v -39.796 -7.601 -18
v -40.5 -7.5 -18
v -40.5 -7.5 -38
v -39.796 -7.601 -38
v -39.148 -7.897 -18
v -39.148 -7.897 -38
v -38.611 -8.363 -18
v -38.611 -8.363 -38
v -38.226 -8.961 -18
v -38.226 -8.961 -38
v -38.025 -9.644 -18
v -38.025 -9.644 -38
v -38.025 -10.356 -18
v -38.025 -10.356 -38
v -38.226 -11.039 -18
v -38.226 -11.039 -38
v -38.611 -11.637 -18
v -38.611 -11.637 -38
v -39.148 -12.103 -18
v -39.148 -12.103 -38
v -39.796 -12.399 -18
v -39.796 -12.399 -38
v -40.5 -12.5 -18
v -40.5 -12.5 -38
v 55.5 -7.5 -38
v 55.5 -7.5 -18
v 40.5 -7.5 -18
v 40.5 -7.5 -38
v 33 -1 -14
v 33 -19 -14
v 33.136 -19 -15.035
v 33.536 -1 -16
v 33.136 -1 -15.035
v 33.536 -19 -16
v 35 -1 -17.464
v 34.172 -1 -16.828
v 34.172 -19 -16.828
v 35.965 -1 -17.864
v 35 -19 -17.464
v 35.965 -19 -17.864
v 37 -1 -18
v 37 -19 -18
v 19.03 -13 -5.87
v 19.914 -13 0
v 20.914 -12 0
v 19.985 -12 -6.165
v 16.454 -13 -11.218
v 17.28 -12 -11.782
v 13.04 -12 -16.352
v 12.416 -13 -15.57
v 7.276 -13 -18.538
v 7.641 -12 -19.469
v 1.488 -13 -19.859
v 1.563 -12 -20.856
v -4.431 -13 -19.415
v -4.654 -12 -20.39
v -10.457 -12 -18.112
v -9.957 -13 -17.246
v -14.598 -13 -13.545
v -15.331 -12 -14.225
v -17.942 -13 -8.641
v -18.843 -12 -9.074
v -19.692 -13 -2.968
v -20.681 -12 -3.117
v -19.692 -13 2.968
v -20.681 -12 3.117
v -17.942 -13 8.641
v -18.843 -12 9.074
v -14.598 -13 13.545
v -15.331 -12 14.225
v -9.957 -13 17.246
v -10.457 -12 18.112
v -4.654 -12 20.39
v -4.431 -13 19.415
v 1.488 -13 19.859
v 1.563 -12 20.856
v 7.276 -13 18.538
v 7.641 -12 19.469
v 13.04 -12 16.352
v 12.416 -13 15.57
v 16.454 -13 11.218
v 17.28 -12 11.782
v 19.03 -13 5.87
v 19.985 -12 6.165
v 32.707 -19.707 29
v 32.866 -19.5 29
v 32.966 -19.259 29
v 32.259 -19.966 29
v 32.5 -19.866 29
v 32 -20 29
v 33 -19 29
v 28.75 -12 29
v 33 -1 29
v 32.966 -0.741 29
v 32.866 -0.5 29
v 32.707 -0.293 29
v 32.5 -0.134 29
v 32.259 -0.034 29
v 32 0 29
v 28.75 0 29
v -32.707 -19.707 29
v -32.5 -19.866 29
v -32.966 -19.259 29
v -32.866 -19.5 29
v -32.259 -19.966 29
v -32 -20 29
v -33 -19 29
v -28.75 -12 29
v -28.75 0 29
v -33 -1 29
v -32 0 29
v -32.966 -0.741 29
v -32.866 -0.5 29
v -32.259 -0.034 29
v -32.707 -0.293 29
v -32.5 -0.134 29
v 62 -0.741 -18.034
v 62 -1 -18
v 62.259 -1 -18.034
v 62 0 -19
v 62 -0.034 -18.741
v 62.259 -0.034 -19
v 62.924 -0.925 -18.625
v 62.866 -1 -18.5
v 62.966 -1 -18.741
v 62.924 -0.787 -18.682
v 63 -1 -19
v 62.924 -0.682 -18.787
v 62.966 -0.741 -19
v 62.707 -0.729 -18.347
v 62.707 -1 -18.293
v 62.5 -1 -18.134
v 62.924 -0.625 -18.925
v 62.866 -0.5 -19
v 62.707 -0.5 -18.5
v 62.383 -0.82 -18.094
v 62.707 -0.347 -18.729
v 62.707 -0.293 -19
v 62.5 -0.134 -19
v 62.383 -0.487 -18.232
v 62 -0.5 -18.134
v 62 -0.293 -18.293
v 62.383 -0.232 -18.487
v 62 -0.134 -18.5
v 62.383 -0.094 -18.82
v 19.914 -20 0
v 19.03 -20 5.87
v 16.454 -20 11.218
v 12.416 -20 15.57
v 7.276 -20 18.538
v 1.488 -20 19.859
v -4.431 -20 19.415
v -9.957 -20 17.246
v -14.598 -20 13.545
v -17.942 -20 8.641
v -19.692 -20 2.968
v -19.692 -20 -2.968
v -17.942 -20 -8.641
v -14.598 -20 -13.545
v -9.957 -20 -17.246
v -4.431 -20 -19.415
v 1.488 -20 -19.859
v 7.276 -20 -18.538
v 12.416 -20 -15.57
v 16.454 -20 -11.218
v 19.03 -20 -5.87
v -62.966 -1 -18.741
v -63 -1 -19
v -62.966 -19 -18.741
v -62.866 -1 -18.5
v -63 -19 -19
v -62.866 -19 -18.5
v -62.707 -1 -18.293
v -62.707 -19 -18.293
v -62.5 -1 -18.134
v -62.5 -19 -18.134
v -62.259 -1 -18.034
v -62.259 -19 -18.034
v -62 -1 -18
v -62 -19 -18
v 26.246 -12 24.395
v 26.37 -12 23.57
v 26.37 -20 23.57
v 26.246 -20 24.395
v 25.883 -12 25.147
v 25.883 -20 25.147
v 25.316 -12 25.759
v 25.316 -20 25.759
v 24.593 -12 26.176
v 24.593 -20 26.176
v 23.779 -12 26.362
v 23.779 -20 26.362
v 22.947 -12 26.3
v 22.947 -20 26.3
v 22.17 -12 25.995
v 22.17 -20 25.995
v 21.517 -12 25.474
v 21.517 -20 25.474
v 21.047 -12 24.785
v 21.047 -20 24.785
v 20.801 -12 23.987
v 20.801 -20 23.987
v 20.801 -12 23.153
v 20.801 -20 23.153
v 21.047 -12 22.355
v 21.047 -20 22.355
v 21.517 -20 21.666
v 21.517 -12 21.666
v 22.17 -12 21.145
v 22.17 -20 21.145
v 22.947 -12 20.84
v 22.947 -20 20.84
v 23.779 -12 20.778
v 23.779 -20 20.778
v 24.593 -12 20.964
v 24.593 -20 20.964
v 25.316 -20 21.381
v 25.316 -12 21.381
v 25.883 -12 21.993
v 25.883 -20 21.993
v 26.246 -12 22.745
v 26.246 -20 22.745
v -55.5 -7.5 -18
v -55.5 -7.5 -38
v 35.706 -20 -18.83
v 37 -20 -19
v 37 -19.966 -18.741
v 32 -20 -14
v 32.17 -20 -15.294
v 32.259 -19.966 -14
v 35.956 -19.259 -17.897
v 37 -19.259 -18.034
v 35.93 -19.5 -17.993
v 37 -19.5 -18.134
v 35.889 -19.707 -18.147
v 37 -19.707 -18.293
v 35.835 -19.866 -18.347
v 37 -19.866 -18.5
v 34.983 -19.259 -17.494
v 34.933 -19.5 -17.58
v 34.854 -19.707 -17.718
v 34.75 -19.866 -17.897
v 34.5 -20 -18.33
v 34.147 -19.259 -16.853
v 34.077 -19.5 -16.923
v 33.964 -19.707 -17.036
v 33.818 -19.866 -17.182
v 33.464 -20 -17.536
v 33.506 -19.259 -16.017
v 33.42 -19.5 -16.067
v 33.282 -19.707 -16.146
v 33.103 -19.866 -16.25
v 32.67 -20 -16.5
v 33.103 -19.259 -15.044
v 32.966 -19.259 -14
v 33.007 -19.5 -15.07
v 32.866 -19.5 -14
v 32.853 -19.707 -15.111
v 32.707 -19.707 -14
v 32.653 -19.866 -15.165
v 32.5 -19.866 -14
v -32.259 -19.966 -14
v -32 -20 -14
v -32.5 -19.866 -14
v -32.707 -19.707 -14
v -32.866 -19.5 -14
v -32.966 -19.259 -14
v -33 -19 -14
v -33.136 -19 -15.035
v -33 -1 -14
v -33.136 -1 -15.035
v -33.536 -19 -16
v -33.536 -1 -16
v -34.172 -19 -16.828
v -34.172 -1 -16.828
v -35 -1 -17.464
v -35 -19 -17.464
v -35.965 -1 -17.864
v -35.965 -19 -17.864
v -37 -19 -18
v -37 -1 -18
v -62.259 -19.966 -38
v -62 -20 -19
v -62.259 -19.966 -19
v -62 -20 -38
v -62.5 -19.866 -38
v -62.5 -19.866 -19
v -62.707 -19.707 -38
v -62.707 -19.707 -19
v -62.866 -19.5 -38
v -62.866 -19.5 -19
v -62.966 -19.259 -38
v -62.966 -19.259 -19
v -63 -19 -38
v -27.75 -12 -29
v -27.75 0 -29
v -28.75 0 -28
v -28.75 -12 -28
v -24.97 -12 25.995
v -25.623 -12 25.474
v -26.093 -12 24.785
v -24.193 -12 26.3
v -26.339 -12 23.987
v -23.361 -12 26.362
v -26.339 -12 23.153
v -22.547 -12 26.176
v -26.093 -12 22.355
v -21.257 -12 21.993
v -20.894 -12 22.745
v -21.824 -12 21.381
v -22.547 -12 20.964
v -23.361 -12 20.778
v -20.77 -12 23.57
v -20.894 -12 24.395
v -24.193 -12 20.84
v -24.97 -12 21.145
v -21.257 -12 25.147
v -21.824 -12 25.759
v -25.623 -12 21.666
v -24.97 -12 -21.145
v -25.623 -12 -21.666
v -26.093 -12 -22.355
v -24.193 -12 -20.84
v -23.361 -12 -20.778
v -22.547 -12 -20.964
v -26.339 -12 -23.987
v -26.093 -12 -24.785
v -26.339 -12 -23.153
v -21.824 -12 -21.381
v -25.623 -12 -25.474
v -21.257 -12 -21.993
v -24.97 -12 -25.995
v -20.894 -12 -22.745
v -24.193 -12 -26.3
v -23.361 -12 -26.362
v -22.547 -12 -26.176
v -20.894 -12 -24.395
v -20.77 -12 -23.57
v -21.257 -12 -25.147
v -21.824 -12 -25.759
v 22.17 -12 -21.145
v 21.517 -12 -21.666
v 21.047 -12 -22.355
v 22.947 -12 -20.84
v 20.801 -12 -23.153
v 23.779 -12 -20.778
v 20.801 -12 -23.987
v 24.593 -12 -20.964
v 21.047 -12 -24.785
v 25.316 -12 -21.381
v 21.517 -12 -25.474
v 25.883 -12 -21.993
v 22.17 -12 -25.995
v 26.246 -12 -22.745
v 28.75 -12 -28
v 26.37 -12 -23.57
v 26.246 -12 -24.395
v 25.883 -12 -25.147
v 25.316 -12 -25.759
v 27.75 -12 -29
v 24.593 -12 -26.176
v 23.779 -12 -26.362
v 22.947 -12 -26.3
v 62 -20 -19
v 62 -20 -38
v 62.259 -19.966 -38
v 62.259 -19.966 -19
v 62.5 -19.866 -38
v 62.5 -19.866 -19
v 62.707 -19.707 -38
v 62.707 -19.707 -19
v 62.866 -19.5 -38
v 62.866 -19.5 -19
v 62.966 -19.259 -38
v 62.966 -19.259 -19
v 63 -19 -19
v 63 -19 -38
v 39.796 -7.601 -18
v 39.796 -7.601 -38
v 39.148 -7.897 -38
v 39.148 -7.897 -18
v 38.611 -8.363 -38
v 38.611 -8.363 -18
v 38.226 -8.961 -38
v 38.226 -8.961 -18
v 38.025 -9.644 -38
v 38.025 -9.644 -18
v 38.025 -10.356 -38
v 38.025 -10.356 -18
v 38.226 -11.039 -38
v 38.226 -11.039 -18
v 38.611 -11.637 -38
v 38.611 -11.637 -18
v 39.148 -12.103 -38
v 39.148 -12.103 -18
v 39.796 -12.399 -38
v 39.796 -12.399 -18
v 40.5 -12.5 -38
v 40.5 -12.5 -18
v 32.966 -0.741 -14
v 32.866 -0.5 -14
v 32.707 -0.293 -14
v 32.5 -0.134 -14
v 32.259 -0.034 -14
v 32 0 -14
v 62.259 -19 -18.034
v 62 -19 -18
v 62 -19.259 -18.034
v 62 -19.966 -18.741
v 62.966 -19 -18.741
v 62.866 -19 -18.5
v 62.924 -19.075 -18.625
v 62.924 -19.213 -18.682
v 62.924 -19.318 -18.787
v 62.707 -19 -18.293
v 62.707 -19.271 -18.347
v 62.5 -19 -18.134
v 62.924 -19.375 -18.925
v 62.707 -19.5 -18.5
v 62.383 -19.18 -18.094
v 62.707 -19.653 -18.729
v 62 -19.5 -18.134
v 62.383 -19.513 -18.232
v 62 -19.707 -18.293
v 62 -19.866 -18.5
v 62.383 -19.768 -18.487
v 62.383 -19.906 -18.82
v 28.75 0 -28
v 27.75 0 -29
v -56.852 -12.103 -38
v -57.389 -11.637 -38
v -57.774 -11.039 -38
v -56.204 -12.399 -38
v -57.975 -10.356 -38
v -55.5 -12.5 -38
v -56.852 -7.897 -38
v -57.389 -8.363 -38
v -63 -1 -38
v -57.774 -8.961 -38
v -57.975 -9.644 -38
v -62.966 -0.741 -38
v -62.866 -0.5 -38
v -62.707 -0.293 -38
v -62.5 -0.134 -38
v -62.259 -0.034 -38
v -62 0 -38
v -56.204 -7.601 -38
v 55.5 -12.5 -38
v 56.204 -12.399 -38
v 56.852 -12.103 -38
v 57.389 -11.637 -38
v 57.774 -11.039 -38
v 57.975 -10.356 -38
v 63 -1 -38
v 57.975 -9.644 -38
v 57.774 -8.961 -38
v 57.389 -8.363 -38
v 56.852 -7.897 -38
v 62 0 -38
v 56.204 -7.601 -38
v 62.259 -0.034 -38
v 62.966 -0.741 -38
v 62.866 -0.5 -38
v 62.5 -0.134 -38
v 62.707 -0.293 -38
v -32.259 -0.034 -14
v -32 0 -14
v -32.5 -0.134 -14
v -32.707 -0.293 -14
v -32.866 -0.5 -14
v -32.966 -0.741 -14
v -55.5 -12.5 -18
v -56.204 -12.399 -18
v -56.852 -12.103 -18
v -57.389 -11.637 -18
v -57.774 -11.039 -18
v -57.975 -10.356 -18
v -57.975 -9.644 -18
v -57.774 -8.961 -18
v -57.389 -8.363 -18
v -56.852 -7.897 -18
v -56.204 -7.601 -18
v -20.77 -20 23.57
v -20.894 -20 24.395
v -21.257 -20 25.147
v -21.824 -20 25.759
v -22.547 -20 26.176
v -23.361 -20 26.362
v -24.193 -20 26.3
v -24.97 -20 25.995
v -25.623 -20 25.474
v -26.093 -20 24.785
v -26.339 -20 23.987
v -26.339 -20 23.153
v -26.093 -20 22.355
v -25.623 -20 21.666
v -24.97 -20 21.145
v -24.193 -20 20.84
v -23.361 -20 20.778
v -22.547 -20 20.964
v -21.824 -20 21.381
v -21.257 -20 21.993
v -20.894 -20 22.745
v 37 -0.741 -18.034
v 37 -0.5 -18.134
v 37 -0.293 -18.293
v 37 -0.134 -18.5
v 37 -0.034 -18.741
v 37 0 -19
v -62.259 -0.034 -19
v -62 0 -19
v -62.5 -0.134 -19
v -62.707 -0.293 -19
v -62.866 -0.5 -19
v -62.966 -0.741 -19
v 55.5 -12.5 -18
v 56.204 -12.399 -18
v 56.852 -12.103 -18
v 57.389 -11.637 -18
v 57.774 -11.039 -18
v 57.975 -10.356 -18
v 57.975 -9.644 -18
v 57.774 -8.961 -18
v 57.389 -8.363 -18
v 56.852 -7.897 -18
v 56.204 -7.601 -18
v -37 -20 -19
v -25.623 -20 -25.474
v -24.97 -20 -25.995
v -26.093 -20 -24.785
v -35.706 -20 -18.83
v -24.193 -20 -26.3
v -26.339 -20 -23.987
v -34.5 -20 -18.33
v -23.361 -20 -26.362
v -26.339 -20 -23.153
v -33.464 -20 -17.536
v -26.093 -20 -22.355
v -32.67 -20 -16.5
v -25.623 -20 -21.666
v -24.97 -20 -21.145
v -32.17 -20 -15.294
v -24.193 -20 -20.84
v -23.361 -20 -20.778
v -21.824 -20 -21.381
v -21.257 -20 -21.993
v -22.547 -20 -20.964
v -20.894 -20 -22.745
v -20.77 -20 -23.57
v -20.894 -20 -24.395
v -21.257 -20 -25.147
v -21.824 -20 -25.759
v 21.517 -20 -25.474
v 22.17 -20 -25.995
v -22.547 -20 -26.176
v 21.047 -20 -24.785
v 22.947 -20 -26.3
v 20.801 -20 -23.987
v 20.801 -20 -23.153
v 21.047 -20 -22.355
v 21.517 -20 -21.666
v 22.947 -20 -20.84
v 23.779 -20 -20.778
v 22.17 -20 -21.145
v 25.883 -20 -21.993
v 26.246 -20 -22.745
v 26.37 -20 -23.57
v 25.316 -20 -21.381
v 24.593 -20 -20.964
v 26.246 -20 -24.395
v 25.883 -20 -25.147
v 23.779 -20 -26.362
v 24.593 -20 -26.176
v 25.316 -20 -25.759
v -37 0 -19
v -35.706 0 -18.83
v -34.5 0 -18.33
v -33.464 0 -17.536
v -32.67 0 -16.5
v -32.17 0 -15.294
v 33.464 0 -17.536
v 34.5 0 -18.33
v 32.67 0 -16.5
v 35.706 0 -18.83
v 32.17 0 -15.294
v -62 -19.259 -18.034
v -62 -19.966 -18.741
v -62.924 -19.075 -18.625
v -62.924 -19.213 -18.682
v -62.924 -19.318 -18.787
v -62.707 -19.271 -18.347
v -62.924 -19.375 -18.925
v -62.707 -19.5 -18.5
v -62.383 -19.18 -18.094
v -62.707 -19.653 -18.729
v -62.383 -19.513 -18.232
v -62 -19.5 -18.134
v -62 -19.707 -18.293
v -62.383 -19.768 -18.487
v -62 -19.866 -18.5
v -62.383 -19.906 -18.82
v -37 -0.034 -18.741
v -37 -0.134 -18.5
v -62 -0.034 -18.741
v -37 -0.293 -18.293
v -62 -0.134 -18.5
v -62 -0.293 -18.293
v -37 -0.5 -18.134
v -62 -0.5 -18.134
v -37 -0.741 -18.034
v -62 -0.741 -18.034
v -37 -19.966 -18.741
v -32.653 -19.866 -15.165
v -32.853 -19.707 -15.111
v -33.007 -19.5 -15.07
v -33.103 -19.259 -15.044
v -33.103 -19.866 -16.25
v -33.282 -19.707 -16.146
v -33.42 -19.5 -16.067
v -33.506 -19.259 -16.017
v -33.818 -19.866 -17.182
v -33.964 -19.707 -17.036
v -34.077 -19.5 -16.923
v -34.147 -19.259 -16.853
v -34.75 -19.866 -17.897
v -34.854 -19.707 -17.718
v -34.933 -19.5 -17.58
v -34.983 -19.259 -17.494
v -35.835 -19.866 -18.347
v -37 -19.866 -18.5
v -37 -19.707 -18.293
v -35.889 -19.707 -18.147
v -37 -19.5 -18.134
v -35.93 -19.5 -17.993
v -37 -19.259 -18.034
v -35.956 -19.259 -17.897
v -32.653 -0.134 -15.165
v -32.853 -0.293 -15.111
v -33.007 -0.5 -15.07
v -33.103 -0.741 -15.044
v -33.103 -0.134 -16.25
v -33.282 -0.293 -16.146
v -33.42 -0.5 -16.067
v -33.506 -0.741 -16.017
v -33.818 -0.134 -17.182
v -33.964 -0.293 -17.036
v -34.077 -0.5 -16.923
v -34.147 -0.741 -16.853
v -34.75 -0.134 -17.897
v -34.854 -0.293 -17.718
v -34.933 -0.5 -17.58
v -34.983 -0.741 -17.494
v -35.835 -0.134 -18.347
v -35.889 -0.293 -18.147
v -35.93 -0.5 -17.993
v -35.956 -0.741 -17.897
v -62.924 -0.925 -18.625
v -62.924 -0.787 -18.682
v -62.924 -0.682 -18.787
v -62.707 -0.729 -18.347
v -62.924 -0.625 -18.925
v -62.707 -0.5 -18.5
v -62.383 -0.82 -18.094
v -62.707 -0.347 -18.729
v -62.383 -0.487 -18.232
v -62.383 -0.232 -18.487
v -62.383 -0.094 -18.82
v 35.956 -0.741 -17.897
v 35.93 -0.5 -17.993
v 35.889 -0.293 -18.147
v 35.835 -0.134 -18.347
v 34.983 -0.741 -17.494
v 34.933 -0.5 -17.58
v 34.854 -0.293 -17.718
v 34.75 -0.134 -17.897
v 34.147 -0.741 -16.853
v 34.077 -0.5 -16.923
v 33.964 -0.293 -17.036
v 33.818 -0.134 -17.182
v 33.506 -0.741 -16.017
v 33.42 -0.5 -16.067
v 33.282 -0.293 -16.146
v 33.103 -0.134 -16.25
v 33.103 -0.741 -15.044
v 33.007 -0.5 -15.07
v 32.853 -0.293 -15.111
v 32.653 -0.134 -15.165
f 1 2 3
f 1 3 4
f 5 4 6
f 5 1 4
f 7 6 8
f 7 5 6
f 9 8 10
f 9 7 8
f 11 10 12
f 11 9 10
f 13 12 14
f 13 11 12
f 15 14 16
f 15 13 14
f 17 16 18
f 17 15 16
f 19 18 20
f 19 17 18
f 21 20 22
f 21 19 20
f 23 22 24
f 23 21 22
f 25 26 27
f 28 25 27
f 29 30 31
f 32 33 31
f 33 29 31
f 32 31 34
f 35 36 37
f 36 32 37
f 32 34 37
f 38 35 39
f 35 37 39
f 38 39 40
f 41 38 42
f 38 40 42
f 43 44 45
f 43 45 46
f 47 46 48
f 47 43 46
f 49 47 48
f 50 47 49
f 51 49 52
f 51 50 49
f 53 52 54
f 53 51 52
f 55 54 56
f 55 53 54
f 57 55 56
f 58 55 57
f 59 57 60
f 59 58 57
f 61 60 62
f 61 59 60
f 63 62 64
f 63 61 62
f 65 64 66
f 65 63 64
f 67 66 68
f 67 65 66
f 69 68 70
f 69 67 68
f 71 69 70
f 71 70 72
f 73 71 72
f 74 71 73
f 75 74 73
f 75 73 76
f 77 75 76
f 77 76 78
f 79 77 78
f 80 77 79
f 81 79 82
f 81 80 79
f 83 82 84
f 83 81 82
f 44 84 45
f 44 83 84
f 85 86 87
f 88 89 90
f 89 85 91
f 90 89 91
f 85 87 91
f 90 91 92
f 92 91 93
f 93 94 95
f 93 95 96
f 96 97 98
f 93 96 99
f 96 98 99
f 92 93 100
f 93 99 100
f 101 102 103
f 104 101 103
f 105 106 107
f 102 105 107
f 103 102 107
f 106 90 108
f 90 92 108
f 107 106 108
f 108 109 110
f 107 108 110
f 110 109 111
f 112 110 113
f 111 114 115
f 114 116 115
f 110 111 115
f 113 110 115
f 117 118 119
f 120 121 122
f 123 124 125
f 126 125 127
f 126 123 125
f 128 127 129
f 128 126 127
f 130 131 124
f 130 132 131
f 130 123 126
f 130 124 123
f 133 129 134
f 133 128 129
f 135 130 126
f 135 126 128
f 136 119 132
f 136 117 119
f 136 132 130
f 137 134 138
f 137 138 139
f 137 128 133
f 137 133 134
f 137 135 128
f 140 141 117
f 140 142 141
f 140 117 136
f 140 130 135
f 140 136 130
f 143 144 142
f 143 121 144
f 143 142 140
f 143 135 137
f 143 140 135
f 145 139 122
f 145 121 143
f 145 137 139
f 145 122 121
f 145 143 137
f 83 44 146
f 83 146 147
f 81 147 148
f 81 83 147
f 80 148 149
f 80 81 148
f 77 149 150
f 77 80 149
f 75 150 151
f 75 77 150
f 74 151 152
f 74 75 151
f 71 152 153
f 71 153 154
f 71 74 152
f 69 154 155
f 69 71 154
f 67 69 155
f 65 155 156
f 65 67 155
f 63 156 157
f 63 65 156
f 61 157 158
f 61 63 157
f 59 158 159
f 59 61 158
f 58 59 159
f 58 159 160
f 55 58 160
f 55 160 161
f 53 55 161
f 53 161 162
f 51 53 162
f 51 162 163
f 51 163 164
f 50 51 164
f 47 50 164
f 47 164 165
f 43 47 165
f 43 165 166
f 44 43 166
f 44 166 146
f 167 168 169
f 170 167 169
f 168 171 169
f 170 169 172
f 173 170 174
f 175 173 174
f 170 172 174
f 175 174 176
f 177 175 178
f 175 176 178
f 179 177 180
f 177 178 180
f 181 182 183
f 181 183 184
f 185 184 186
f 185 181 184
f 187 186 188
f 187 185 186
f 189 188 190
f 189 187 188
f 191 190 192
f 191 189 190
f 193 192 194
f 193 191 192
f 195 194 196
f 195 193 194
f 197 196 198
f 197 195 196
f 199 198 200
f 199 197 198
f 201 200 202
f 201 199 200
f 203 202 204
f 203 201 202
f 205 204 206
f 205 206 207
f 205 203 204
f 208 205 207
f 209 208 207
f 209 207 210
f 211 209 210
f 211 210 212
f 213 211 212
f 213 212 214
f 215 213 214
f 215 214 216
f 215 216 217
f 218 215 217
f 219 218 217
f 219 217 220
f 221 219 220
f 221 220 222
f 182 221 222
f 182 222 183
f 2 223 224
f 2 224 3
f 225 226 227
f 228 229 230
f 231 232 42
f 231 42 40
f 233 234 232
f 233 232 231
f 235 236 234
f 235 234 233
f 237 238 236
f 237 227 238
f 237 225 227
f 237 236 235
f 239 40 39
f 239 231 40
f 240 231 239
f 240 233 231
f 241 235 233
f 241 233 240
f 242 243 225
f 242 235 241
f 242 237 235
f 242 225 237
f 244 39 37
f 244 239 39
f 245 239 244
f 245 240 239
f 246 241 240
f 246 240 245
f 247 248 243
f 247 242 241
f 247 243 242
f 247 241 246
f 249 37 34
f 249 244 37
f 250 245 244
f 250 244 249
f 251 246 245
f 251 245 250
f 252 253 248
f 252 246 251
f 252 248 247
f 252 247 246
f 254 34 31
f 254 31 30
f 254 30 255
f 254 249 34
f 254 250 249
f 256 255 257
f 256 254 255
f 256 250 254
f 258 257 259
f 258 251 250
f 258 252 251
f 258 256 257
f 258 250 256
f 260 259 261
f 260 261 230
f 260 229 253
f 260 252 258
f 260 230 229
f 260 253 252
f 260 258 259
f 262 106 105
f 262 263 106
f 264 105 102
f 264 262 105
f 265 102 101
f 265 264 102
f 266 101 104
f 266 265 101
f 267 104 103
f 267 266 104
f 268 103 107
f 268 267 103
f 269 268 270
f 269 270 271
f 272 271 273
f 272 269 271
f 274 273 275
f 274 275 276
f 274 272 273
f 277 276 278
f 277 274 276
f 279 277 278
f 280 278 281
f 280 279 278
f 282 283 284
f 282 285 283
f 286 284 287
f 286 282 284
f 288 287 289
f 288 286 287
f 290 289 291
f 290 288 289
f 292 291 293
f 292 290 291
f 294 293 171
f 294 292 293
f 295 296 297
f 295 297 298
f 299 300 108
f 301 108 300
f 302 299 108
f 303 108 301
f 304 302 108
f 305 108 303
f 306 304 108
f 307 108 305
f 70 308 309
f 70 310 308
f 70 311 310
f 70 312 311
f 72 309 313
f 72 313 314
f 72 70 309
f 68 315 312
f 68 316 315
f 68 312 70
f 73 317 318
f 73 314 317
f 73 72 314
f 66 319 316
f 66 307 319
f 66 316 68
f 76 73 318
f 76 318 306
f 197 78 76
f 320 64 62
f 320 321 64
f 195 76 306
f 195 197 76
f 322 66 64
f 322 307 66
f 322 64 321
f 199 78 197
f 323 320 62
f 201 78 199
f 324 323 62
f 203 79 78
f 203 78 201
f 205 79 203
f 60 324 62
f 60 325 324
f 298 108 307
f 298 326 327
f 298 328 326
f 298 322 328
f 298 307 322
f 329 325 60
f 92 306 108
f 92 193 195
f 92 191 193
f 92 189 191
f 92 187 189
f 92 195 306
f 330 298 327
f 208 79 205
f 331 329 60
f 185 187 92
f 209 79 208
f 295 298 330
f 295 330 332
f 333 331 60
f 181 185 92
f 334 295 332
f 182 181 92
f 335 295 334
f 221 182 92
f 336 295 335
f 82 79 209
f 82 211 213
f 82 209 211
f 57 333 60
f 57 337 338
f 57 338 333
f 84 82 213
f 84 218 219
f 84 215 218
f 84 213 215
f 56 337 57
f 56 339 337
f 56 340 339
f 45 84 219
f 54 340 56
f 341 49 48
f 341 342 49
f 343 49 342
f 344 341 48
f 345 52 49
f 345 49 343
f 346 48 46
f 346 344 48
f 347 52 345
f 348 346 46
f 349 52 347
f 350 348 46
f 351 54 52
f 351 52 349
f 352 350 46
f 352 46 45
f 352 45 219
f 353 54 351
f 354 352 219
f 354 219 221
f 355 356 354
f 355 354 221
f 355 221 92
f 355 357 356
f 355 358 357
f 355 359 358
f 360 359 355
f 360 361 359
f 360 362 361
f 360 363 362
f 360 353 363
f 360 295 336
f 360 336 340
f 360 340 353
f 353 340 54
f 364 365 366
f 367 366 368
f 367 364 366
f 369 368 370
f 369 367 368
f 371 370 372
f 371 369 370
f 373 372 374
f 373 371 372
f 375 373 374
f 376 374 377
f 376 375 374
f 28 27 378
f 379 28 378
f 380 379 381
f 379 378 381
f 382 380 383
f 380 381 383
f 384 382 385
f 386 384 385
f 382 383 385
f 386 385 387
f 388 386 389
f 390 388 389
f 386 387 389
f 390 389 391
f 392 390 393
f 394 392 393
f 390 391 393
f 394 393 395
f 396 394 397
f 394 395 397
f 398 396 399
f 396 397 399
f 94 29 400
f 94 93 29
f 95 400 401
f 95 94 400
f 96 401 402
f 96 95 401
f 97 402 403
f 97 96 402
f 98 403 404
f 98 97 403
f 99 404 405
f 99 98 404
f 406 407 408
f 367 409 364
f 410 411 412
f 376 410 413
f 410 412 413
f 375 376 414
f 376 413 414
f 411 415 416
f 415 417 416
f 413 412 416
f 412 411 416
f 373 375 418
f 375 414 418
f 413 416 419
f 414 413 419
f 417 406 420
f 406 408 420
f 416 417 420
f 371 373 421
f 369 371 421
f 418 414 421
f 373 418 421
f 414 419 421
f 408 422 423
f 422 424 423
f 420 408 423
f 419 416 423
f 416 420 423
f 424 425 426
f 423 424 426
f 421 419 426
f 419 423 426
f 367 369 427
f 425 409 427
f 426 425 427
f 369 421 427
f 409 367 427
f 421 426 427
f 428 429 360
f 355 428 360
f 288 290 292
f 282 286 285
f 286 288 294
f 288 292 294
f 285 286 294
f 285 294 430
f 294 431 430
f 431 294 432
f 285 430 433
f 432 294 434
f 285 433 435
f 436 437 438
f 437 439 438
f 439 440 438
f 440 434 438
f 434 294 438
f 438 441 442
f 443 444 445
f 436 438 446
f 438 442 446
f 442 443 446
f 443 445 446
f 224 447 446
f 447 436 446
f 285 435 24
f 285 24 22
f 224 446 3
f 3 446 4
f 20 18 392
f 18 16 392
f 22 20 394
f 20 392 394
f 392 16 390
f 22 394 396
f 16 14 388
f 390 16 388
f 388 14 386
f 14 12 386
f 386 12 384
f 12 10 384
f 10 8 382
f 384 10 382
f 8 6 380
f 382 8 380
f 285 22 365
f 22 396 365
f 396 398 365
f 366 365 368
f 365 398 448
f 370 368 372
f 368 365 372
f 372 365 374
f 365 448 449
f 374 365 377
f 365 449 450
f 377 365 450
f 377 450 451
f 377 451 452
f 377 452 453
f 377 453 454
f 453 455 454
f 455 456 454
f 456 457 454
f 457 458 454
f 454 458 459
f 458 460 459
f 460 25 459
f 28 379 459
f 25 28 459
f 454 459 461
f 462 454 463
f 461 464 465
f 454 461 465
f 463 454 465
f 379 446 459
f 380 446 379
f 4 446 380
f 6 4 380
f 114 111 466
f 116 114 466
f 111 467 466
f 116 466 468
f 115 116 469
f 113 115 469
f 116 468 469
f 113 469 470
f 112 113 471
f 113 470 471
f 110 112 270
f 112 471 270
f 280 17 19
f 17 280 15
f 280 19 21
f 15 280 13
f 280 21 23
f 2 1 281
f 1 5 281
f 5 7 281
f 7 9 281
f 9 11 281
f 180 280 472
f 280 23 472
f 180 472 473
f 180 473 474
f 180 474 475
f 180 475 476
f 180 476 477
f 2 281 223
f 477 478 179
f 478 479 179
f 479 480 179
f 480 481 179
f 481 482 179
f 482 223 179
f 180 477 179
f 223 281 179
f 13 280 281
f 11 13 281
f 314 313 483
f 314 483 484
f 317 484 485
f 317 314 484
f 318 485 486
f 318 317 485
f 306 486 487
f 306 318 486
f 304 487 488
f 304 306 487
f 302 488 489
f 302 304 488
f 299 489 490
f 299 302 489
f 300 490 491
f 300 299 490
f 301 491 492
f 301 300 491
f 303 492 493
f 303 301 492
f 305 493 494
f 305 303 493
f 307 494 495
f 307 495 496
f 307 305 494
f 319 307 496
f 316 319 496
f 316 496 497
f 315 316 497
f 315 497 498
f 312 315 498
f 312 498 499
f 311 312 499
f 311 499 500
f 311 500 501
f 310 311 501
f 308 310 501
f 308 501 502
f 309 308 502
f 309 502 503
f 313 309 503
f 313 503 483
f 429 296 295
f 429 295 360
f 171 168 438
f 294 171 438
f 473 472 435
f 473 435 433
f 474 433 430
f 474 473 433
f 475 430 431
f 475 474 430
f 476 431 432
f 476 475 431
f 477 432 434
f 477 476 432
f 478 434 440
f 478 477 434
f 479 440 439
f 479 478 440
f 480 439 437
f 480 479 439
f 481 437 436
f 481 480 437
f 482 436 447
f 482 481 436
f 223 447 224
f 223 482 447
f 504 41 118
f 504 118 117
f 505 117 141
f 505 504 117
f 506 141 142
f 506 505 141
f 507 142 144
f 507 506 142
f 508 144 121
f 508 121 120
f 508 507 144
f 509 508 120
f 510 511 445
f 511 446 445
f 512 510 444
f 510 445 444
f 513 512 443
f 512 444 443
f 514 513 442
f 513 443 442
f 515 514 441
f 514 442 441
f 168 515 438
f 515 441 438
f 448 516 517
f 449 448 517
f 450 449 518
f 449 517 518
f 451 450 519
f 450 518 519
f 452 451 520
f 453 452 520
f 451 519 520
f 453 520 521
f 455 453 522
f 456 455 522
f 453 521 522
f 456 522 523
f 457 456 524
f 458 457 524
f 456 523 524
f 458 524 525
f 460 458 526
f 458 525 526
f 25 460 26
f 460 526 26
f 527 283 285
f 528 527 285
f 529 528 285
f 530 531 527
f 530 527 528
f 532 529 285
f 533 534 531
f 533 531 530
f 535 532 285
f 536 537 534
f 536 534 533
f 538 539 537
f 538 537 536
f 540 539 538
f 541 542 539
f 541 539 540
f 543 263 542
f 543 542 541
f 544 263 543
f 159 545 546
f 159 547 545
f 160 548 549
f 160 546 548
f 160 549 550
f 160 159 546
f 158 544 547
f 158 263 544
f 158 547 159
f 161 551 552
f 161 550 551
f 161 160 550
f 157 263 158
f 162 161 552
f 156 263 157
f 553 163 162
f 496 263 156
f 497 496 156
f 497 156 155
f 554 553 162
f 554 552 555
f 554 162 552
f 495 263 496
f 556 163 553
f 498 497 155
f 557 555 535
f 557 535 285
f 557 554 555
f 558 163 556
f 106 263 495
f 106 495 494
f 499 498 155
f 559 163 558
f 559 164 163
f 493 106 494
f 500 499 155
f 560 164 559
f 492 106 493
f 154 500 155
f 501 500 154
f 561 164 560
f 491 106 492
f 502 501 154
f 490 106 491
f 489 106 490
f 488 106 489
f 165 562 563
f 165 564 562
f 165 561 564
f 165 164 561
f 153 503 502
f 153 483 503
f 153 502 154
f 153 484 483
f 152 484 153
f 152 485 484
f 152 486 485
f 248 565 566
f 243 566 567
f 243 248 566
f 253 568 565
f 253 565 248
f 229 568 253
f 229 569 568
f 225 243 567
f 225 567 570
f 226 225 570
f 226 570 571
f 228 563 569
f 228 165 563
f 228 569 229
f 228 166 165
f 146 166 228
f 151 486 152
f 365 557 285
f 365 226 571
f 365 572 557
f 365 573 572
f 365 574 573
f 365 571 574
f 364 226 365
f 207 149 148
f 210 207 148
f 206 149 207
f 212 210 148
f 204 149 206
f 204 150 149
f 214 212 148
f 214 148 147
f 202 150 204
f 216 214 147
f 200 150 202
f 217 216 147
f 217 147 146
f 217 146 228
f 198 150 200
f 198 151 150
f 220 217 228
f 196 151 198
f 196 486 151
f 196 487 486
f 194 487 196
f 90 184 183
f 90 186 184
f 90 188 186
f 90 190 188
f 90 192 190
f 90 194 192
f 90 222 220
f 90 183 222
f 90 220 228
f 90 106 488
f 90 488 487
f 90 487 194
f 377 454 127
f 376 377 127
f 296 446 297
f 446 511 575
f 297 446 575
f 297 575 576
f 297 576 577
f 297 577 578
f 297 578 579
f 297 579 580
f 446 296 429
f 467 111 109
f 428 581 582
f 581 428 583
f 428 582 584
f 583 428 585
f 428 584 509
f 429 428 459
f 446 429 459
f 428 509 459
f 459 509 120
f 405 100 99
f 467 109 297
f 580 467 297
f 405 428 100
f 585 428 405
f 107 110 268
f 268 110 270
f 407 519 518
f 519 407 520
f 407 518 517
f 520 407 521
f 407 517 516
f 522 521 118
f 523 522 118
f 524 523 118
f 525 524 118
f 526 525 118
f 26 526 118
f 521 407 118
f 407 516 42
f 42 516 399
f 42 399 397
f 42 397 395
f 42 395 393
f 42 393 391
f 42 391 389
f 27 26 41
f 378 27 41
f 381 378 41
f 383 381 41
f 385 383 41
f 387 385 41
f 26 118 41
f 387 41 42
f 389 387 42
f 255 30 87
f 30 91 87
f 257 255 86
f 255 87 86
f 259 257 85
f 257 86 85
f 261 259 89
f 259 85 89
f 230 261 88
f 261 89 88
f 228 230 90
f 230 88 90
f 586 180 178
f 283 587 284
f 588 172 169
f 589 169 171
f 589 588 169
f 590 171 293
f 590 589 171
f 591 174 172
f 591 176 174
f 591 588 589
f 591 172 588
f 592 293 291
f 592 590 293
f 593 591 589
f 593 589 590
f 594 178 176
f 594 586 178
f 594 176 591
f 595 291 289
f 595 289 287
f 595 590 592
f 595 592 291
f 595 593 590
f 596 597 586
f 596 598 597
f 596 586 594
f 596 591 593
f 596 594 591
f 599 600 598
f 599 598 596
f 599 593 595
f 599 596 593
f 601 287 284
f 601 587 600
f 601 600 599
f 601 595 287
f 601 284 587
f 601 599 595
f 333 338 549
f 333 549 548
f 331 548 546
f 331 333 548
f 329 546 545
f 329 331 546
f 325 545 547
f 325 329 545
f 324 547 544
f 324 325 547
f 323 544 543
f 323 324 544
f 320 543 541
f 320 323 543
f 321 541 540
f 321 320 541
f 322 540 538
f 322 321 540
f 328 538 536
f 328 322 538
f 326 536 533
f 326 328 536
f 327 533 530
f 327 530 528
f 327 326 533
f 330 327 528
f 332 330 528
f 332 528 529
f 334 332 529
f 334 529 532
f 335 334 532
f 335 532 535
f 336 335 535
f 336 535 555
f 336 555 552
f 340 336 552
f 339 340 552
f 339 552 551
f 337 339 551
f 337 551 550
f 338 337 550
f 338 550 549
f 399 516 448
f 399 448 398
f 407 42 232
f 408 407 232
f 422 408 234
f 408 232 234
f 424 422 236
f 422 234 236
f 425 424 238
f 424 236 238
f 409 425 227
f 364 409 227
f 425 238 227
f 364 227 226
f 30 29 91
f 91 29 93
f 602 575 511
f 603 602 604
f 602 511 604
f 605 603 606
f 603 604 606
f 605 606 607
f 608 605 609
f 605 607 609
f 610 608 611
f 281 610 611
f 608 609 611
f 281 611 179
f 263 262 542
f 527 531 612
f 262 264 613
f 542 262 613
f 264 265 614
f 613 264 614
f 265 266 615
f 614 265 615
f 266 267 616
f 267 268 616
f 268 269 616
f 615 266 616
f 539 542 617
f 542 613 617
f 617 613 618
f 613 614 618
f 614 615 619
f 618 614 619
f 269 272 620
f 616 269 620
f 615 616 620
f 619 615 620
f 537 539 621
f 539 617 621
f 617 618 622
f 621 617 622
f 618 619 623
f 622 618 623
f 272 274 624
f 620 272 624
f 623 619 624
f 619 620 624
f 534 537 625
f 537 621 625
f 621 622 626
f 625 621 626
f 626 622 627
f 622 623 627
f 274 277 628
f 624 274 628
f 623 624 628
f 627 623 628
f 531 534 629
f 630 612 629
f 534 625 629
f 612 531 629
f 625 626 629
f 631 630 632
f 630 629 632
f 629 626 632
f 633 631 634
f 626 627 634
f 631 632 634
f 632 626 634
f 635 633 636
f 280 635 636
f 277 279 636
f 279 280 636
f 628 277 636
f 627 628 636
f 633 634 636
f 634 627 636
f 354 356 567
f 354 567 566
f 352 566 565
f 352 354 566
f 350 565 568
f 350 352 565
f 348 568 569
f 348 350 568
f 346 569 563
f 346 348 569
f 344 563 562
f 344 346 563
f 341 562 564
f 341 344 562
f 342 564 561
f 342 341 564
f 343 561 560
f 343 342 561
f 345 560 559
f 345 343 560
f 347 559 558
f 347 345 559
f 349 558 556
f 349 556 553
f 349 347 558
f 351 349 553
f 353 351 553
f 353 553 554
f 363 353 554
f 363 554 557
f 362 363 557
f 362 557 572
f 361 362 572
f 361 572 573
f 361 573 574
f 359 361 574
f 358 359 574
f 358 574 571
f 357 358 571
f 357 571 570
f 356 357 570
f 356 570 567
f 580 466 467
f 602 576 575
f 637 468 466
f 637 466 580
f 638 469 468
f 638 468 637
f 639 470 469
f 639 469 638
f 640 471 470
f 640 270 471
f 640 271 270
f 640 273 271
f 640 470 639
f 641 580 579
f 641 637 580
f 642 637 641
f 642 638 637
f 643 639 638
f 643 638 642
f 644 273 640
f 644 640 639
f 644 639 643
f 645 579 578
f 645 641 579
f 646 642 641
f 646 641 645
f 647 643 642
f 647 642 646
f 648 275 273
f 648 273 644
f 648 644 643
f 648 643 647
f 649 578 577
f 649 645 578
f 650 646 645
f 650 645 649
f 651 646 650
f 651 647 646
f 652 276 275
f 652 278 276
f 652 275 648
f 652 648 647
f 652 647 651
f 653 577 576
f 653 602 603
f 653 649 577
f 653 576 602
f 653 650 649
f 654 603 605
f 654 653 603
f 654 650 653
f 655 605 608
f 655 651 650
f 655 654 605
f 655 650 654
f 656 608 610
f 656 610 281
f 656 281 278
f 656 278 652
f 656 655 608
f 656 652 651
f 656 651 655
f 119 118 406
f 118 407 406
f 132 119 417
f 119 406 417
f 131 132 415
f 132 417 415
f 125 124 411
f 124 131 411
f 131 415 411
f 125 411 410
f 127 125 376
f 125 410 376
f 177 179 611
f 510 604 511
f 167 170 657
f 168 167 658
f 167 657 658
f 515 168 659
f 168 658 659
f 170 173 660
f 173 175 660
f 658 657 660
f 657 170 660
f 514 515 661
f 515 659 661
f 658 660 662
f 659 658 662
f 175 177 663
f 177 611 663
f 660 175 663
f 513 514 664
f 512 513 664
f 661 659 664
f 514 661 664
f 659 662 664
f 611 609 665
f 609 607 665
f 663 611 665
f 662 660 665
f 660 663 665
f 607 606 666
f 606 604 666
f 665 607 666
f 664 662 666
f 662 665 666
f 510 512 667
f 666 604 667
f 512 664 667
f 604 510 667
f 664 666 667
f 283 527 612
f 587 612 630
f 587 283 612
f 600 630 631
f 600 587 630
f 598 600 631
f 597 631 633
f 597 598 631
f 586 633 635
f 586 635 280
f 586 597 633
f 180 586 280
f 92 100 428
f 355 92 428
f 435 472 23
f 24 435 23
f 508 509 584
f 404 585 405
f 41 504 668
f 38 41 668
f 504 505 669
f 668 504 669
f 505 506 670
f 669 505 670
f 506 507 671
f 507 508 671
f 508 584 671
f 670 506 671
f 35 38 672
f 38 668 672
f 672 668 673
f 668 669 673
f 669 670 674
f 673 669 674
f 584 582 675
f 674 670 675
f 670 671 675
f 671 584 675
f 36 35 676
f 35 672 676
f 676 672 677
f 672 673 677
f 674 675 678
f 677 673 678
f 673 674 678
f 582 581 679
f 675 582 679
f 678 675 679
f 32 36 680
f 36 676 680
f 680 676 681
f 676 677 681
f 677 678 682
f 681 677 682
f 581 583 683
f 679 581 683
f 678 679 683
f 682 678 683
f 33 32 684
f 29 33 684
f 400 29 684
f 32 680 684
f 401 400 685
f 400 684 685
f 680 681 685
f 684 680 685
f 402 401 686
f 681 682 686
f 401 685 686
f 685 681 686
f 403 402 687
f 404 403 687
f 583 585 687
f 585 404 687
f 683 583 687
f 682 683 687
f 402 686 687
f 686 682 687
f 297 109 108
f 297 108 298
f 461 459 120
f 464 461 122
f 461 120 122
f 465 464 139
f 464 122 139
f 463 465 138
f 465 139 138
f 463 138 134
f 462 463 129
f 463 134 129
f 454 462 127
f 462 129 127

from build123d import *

# Parameters (mm, degrees)
SKETCH_R        = 2.8
SKETCH_R_2      = 19.914493
PAD_DEPTH       = 20
SKETCH001_W     = 57.5
SKETCH001_H     = 58
POCKET_DEPTH    = 12
POCKET001_DEPTH = 308.202319
FILLET_R        = 4
FILLET001_R     = 1
CHAMFER_SIZE    = 1
CHAMFER001_SIZE = 1


with BuildPart() as part:
    # Sketch → Pad (new body)
    with BuildSketch(Plane.XZ):
        Polygon((33, -18), (33, 29), (-33, 29), (-33, -18), (-63, -18), (-63, -38), (63, -38), (63, -18), align=None)
        with Locations((-23.57, -23.57)):
            Circle(SKETCH_R, mode=Mode.SUBTRACT)
        with Locations((23.57, -23.57)):
            Circle(SKETCH_R, mode=Mode.SUBTRACT)
        with Locations((-23.57, 23.57)):
            Circle(SKETCH_R, mode=Mode.SUBTRACT)
        Circle(SKETCH_R_2, mode=Mode.SUBTRACT)
        with Locations((23.57, 23.57)):
            Circle(SKETCH_R, mode=Mode.SUBTRACT)
    extrude(amount=PAD_DEPTH)

    # Sketch001 (on Face14 of Pad) → Pocket (cut)
    with BuildSketch(Plane(origin=(0, 0, 0), x_dir=(1, 0, 0), z_dir=(0, 1, 0))):
        Rectangle(SKETCH001_W, SKETCH001_H)
    extrude(amount=-POCKET_DEPTH, mode=Mode.SUBTRACT)

    # Sketch002 (on Face2 of Pocket) → Pocket001 (cut, through all)
    with BuildSketch(Plane(origin=(0, 0, -18), x_dir=(-1, 0, 0), z_dir=(0, 0, 1))):
        with BuildLine():
            ThreePointArc((-55.5, 12.5), (-58, 10), (-55.5, 7.5))
            Line((-55.5, 7.5), (-40.5, 7.5))
            ThreePointArc((-40.5, 7.5), (-38, 10), (-40.5, 12.5))
            Line((-55.5, 12.5), (-40.5, 12.5))
        make_face()
    pocket001 = extrude(amount=-POCKET001_DEPTH, mode=Mode.SUBTRACT)

    # Mirrored: Pocket001 across Sketch002 V_Axis
    add(pocket001.mirror(Plane(origin=(0, 0, -18), x_dir=(0, 0, 1), z_dir=(-1, 0, 0))), mode=Mode.SUBTRACT)

    # Fillet
    fillet_edges = [part.edges().sort_by_distance(p)[0] for p in [
        (33, -10, -18),
        (-33, -10, -18),
    ]]
    fillet(fillet_edges, radius=FILLET_R)

    # Fillet001
    fillet001_edges = [part.edges().sort_by_distance(p)[0] for p in [
        (33, 0, 7.5),
        (-33, 0, 7.5),
        (33, -20, 7.5),
        (-33, -20, 7.5),
        (63, -10, -18),
        (-63, -10, -18),
        (-63, 0, -28),
        (-63, -20, -28),
        (63, 0, -28),
        (63, -20, -28),
    ]]
    fillet(fillet001_edges, radius=FILLET001_R)

    # Chamfer
    chamfer_edges = [part.edges().sort_by_distance(p)[0] for p in [
        (28.75, -6, -29),
        (-28.75, -6, -29),
    ]]
    chamfer(chamfer_edges, length=CHAMFER_SIZE)

    # Chamfer001
    chamfer001_edges = [part.edges().sort_by_distance(p)[0] for p in [
        (-19.914493, -12, 0),
    ]]
    chamfer(chamfer001_edges, length=CHAMFER001_SIZE)


solid = part.part
